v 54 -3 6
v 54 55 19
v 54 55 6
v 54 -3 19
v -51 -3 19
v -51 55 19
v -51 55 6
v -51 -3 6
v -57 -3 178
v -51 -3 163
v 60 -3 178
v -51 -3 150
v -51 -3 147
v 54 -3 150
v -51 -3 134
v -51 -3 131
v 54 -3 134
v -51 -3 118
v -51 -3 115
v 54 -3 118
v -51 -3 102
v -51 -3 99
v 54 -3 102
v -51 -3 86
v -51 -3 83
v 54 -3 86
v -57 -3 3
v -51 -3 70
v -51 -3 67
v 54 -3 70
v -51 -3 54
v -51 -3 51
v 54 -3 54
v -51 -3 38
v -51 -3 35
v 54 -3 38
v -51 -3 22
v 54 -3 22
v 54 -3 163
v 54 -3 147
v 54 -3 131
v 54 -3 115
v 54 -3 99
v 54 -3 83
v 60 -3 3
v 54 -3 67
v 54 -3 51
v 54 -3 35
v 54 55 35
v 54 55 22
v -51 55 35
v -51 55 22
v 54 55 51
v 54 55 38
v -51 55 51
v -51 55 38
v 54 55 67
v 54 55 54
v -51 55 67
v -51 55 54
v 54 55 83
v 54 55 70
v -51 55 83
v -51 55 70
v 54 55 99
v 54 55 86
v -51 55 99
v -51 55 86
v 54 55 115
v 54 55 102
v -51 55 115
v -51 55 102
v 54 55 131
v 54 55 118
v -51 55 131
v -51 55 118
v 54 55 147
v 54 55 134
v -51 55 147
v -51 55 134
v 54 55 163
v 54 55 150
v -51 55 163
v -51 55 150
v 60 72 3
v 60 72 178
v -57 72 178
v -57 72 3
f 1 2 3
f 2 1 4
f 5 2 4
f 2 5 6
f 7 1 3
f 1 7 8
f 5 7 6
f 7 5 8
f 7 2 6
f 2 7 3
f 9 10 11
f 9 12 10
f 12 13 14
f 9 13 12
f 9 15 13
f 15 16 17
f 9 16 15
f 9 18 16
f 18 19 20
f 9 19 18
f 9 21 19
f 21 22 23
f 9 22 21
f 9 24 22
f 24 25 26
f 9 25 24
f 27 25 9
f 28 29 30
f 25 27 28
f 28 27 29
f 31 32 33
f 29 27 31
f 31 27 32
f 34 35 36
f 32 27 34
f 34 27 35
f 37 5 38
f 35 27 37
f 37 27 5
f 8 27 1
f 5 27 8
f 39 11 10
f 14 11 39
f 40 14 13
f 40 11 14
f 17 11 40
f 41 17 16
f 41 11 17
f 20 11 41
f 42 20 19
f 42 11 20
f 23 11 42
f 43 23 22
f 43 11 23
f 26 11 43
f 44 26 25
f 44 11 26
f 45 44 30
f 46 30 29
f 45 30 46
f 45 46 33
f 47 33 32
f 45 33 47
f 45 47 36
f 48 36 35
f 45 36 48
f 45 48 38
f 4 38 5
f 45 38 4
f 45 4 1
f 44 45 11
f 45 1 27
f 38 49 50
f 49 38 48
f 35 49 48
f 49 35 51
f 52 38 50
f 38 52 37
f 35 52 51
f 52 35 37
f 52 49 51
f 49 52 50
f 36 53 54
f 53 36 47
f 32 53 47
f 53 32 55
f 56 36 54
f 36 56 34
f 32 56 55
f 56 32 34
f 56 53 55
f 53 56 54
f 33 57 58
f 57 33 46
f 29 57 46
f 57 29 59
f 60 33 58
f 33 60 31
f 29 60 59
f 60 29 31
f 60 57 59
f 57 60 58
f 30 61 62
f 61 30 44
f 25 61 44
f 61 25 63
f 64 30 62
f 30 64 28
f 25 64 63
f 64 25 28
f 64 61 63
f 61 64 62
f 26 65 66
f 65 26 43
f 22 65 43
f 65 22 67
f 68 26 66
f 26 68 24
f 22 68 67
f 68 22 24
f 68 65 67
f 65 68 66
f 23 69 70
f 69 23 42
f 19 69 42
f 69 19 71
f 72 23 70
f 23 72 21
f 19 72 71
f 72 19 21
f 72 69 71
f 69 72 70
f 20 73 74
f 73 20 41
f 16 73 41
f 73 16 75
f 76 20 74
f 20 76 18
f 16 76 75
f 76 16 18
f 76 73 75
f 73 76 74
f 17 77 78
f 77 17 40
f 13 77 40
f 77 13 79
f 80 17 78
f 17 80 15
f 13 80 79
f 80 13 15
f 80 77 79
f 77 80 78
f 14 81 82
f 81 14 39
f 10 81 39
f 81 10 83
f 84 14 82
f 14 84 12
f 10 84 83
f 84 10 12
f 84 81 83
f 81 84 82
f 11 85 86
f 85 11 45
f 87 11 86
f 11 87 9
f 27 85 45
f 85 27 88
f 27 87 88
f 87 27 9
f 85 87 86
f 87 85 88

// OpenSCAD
difference() {
  translate([1.5000570000, 34.5000000000, 90.4997537500]) {
    scale([117.0000000000, 75.0000000000, 175.0000000000]) {
      translate([-0.5000000000, -0.5000000000, -0.5000000000]) {
        cube([1, 1, 1]);
      }
    }
  }
  union() {
    union() {
      union() {
        union() {
          union() {
            union() {
              union() {
                union() {
                  union() {
                    translate([1.5000000000, 26.0000000000, 12.5000000000]) {
                      scale([105.0000000000, 58.0000000000, 13.0000000000]) {
                        translate([-0.5000000000, -0.5000000000, -0.5000000000]) {
                          cube([1, 1, 1]);
                        }
                      }
                    }
                    translate([1.5000000000, 26.0000000000, 28.5000000000]) {
                      scale([105.0000000000, 58.0000000000, 13.0000000000]) {
                        translate([-0.5000000000, -0.5000000000, -0.5000000000]) {
                          cube([1, 1, 1]);
                        }
                      }
                    }
                  }
                  translate([1.5000000000, 26.0000000000, 44.5000000000]) {
                    scale([105.0000000000, 58.0000000000, 13.0000000000]) {
                      translate([-0.5000000000, -0.5000000000, -0.5000000000]) {
                        cube([1, 1, 1]);
                      }
                    }
                  }
                }
                translate([1.5000000000, 26.0000000000, 60.5000000000]) {
                  scale([105.0000000000, 58.0000000000, 13.0000000000]) {
                    translate([-0.5000000000, -0.5000000000, -0.5000000000]) {
                      cube([1, 1, 1]);
                    }
                  }
                }
              }
              translate([1.5000000000, 26.0000000000, 76.5000000000]) {
                scale([105.0000000000, 58.0000000000, 13.0000000000]) {
                  translate([-0.5000000000, -0.5000000000, -0.5000000000]) {
                    cube([1, 1, 1]);
                  }
                }
              }
            }
            translate([1.5000000000, 26.0000000000, 92.5000000000]) {
              scale([105.0000000000, 58.0000000000, 13.0000000000]) {
                translate([-0.5000000000, -0.5000000000, -0.5000000000]) {
                  cube([1, 1, 1]);
                }
              }
            }
          }
          translate([1.5000000000, 26.0000000000, 108.5000000000]) {
            scale([105.0000000000, 58.0000000000, 13.0000000000]) {
              translate([-0.5000000000, -0.5000000000, -0.5000000000]) {
                cube([1, 1, 1]);
              }
            }
          }
        }
        translate([1.5000000000, 26.0000000000, 124.5000000000]) {
          scale([105.0000000000, 58.0000000000, 13.0000000000]) {
            translate([-0.5000000000, -0.5000000000, -0.5000000000]) {
              cube([1, 1, 1]);
            }
          }
        }
      }
      translate([1.5000000000, 26.0000000000, 140.5000000000]) {
        scale([105.0000000000, 58.0000000000, 13.0000000000]) {
          translate([-0.5000000000, -0.5000000000, -0.5000000000]) {
            cube([1, 1, 1]);
          }
        }
      }
    }
    translate([1.5000000000, 26.0000000000, 156.5000000000]) {
      scale([105.0000000000, 58.0000000000, 13.0000000000]) {
        translate([-0.5000000000, -0.5000000000, -0.5000000000]) {
          cube([1, 1, 1]);
        }
      }
    }
  }
}
